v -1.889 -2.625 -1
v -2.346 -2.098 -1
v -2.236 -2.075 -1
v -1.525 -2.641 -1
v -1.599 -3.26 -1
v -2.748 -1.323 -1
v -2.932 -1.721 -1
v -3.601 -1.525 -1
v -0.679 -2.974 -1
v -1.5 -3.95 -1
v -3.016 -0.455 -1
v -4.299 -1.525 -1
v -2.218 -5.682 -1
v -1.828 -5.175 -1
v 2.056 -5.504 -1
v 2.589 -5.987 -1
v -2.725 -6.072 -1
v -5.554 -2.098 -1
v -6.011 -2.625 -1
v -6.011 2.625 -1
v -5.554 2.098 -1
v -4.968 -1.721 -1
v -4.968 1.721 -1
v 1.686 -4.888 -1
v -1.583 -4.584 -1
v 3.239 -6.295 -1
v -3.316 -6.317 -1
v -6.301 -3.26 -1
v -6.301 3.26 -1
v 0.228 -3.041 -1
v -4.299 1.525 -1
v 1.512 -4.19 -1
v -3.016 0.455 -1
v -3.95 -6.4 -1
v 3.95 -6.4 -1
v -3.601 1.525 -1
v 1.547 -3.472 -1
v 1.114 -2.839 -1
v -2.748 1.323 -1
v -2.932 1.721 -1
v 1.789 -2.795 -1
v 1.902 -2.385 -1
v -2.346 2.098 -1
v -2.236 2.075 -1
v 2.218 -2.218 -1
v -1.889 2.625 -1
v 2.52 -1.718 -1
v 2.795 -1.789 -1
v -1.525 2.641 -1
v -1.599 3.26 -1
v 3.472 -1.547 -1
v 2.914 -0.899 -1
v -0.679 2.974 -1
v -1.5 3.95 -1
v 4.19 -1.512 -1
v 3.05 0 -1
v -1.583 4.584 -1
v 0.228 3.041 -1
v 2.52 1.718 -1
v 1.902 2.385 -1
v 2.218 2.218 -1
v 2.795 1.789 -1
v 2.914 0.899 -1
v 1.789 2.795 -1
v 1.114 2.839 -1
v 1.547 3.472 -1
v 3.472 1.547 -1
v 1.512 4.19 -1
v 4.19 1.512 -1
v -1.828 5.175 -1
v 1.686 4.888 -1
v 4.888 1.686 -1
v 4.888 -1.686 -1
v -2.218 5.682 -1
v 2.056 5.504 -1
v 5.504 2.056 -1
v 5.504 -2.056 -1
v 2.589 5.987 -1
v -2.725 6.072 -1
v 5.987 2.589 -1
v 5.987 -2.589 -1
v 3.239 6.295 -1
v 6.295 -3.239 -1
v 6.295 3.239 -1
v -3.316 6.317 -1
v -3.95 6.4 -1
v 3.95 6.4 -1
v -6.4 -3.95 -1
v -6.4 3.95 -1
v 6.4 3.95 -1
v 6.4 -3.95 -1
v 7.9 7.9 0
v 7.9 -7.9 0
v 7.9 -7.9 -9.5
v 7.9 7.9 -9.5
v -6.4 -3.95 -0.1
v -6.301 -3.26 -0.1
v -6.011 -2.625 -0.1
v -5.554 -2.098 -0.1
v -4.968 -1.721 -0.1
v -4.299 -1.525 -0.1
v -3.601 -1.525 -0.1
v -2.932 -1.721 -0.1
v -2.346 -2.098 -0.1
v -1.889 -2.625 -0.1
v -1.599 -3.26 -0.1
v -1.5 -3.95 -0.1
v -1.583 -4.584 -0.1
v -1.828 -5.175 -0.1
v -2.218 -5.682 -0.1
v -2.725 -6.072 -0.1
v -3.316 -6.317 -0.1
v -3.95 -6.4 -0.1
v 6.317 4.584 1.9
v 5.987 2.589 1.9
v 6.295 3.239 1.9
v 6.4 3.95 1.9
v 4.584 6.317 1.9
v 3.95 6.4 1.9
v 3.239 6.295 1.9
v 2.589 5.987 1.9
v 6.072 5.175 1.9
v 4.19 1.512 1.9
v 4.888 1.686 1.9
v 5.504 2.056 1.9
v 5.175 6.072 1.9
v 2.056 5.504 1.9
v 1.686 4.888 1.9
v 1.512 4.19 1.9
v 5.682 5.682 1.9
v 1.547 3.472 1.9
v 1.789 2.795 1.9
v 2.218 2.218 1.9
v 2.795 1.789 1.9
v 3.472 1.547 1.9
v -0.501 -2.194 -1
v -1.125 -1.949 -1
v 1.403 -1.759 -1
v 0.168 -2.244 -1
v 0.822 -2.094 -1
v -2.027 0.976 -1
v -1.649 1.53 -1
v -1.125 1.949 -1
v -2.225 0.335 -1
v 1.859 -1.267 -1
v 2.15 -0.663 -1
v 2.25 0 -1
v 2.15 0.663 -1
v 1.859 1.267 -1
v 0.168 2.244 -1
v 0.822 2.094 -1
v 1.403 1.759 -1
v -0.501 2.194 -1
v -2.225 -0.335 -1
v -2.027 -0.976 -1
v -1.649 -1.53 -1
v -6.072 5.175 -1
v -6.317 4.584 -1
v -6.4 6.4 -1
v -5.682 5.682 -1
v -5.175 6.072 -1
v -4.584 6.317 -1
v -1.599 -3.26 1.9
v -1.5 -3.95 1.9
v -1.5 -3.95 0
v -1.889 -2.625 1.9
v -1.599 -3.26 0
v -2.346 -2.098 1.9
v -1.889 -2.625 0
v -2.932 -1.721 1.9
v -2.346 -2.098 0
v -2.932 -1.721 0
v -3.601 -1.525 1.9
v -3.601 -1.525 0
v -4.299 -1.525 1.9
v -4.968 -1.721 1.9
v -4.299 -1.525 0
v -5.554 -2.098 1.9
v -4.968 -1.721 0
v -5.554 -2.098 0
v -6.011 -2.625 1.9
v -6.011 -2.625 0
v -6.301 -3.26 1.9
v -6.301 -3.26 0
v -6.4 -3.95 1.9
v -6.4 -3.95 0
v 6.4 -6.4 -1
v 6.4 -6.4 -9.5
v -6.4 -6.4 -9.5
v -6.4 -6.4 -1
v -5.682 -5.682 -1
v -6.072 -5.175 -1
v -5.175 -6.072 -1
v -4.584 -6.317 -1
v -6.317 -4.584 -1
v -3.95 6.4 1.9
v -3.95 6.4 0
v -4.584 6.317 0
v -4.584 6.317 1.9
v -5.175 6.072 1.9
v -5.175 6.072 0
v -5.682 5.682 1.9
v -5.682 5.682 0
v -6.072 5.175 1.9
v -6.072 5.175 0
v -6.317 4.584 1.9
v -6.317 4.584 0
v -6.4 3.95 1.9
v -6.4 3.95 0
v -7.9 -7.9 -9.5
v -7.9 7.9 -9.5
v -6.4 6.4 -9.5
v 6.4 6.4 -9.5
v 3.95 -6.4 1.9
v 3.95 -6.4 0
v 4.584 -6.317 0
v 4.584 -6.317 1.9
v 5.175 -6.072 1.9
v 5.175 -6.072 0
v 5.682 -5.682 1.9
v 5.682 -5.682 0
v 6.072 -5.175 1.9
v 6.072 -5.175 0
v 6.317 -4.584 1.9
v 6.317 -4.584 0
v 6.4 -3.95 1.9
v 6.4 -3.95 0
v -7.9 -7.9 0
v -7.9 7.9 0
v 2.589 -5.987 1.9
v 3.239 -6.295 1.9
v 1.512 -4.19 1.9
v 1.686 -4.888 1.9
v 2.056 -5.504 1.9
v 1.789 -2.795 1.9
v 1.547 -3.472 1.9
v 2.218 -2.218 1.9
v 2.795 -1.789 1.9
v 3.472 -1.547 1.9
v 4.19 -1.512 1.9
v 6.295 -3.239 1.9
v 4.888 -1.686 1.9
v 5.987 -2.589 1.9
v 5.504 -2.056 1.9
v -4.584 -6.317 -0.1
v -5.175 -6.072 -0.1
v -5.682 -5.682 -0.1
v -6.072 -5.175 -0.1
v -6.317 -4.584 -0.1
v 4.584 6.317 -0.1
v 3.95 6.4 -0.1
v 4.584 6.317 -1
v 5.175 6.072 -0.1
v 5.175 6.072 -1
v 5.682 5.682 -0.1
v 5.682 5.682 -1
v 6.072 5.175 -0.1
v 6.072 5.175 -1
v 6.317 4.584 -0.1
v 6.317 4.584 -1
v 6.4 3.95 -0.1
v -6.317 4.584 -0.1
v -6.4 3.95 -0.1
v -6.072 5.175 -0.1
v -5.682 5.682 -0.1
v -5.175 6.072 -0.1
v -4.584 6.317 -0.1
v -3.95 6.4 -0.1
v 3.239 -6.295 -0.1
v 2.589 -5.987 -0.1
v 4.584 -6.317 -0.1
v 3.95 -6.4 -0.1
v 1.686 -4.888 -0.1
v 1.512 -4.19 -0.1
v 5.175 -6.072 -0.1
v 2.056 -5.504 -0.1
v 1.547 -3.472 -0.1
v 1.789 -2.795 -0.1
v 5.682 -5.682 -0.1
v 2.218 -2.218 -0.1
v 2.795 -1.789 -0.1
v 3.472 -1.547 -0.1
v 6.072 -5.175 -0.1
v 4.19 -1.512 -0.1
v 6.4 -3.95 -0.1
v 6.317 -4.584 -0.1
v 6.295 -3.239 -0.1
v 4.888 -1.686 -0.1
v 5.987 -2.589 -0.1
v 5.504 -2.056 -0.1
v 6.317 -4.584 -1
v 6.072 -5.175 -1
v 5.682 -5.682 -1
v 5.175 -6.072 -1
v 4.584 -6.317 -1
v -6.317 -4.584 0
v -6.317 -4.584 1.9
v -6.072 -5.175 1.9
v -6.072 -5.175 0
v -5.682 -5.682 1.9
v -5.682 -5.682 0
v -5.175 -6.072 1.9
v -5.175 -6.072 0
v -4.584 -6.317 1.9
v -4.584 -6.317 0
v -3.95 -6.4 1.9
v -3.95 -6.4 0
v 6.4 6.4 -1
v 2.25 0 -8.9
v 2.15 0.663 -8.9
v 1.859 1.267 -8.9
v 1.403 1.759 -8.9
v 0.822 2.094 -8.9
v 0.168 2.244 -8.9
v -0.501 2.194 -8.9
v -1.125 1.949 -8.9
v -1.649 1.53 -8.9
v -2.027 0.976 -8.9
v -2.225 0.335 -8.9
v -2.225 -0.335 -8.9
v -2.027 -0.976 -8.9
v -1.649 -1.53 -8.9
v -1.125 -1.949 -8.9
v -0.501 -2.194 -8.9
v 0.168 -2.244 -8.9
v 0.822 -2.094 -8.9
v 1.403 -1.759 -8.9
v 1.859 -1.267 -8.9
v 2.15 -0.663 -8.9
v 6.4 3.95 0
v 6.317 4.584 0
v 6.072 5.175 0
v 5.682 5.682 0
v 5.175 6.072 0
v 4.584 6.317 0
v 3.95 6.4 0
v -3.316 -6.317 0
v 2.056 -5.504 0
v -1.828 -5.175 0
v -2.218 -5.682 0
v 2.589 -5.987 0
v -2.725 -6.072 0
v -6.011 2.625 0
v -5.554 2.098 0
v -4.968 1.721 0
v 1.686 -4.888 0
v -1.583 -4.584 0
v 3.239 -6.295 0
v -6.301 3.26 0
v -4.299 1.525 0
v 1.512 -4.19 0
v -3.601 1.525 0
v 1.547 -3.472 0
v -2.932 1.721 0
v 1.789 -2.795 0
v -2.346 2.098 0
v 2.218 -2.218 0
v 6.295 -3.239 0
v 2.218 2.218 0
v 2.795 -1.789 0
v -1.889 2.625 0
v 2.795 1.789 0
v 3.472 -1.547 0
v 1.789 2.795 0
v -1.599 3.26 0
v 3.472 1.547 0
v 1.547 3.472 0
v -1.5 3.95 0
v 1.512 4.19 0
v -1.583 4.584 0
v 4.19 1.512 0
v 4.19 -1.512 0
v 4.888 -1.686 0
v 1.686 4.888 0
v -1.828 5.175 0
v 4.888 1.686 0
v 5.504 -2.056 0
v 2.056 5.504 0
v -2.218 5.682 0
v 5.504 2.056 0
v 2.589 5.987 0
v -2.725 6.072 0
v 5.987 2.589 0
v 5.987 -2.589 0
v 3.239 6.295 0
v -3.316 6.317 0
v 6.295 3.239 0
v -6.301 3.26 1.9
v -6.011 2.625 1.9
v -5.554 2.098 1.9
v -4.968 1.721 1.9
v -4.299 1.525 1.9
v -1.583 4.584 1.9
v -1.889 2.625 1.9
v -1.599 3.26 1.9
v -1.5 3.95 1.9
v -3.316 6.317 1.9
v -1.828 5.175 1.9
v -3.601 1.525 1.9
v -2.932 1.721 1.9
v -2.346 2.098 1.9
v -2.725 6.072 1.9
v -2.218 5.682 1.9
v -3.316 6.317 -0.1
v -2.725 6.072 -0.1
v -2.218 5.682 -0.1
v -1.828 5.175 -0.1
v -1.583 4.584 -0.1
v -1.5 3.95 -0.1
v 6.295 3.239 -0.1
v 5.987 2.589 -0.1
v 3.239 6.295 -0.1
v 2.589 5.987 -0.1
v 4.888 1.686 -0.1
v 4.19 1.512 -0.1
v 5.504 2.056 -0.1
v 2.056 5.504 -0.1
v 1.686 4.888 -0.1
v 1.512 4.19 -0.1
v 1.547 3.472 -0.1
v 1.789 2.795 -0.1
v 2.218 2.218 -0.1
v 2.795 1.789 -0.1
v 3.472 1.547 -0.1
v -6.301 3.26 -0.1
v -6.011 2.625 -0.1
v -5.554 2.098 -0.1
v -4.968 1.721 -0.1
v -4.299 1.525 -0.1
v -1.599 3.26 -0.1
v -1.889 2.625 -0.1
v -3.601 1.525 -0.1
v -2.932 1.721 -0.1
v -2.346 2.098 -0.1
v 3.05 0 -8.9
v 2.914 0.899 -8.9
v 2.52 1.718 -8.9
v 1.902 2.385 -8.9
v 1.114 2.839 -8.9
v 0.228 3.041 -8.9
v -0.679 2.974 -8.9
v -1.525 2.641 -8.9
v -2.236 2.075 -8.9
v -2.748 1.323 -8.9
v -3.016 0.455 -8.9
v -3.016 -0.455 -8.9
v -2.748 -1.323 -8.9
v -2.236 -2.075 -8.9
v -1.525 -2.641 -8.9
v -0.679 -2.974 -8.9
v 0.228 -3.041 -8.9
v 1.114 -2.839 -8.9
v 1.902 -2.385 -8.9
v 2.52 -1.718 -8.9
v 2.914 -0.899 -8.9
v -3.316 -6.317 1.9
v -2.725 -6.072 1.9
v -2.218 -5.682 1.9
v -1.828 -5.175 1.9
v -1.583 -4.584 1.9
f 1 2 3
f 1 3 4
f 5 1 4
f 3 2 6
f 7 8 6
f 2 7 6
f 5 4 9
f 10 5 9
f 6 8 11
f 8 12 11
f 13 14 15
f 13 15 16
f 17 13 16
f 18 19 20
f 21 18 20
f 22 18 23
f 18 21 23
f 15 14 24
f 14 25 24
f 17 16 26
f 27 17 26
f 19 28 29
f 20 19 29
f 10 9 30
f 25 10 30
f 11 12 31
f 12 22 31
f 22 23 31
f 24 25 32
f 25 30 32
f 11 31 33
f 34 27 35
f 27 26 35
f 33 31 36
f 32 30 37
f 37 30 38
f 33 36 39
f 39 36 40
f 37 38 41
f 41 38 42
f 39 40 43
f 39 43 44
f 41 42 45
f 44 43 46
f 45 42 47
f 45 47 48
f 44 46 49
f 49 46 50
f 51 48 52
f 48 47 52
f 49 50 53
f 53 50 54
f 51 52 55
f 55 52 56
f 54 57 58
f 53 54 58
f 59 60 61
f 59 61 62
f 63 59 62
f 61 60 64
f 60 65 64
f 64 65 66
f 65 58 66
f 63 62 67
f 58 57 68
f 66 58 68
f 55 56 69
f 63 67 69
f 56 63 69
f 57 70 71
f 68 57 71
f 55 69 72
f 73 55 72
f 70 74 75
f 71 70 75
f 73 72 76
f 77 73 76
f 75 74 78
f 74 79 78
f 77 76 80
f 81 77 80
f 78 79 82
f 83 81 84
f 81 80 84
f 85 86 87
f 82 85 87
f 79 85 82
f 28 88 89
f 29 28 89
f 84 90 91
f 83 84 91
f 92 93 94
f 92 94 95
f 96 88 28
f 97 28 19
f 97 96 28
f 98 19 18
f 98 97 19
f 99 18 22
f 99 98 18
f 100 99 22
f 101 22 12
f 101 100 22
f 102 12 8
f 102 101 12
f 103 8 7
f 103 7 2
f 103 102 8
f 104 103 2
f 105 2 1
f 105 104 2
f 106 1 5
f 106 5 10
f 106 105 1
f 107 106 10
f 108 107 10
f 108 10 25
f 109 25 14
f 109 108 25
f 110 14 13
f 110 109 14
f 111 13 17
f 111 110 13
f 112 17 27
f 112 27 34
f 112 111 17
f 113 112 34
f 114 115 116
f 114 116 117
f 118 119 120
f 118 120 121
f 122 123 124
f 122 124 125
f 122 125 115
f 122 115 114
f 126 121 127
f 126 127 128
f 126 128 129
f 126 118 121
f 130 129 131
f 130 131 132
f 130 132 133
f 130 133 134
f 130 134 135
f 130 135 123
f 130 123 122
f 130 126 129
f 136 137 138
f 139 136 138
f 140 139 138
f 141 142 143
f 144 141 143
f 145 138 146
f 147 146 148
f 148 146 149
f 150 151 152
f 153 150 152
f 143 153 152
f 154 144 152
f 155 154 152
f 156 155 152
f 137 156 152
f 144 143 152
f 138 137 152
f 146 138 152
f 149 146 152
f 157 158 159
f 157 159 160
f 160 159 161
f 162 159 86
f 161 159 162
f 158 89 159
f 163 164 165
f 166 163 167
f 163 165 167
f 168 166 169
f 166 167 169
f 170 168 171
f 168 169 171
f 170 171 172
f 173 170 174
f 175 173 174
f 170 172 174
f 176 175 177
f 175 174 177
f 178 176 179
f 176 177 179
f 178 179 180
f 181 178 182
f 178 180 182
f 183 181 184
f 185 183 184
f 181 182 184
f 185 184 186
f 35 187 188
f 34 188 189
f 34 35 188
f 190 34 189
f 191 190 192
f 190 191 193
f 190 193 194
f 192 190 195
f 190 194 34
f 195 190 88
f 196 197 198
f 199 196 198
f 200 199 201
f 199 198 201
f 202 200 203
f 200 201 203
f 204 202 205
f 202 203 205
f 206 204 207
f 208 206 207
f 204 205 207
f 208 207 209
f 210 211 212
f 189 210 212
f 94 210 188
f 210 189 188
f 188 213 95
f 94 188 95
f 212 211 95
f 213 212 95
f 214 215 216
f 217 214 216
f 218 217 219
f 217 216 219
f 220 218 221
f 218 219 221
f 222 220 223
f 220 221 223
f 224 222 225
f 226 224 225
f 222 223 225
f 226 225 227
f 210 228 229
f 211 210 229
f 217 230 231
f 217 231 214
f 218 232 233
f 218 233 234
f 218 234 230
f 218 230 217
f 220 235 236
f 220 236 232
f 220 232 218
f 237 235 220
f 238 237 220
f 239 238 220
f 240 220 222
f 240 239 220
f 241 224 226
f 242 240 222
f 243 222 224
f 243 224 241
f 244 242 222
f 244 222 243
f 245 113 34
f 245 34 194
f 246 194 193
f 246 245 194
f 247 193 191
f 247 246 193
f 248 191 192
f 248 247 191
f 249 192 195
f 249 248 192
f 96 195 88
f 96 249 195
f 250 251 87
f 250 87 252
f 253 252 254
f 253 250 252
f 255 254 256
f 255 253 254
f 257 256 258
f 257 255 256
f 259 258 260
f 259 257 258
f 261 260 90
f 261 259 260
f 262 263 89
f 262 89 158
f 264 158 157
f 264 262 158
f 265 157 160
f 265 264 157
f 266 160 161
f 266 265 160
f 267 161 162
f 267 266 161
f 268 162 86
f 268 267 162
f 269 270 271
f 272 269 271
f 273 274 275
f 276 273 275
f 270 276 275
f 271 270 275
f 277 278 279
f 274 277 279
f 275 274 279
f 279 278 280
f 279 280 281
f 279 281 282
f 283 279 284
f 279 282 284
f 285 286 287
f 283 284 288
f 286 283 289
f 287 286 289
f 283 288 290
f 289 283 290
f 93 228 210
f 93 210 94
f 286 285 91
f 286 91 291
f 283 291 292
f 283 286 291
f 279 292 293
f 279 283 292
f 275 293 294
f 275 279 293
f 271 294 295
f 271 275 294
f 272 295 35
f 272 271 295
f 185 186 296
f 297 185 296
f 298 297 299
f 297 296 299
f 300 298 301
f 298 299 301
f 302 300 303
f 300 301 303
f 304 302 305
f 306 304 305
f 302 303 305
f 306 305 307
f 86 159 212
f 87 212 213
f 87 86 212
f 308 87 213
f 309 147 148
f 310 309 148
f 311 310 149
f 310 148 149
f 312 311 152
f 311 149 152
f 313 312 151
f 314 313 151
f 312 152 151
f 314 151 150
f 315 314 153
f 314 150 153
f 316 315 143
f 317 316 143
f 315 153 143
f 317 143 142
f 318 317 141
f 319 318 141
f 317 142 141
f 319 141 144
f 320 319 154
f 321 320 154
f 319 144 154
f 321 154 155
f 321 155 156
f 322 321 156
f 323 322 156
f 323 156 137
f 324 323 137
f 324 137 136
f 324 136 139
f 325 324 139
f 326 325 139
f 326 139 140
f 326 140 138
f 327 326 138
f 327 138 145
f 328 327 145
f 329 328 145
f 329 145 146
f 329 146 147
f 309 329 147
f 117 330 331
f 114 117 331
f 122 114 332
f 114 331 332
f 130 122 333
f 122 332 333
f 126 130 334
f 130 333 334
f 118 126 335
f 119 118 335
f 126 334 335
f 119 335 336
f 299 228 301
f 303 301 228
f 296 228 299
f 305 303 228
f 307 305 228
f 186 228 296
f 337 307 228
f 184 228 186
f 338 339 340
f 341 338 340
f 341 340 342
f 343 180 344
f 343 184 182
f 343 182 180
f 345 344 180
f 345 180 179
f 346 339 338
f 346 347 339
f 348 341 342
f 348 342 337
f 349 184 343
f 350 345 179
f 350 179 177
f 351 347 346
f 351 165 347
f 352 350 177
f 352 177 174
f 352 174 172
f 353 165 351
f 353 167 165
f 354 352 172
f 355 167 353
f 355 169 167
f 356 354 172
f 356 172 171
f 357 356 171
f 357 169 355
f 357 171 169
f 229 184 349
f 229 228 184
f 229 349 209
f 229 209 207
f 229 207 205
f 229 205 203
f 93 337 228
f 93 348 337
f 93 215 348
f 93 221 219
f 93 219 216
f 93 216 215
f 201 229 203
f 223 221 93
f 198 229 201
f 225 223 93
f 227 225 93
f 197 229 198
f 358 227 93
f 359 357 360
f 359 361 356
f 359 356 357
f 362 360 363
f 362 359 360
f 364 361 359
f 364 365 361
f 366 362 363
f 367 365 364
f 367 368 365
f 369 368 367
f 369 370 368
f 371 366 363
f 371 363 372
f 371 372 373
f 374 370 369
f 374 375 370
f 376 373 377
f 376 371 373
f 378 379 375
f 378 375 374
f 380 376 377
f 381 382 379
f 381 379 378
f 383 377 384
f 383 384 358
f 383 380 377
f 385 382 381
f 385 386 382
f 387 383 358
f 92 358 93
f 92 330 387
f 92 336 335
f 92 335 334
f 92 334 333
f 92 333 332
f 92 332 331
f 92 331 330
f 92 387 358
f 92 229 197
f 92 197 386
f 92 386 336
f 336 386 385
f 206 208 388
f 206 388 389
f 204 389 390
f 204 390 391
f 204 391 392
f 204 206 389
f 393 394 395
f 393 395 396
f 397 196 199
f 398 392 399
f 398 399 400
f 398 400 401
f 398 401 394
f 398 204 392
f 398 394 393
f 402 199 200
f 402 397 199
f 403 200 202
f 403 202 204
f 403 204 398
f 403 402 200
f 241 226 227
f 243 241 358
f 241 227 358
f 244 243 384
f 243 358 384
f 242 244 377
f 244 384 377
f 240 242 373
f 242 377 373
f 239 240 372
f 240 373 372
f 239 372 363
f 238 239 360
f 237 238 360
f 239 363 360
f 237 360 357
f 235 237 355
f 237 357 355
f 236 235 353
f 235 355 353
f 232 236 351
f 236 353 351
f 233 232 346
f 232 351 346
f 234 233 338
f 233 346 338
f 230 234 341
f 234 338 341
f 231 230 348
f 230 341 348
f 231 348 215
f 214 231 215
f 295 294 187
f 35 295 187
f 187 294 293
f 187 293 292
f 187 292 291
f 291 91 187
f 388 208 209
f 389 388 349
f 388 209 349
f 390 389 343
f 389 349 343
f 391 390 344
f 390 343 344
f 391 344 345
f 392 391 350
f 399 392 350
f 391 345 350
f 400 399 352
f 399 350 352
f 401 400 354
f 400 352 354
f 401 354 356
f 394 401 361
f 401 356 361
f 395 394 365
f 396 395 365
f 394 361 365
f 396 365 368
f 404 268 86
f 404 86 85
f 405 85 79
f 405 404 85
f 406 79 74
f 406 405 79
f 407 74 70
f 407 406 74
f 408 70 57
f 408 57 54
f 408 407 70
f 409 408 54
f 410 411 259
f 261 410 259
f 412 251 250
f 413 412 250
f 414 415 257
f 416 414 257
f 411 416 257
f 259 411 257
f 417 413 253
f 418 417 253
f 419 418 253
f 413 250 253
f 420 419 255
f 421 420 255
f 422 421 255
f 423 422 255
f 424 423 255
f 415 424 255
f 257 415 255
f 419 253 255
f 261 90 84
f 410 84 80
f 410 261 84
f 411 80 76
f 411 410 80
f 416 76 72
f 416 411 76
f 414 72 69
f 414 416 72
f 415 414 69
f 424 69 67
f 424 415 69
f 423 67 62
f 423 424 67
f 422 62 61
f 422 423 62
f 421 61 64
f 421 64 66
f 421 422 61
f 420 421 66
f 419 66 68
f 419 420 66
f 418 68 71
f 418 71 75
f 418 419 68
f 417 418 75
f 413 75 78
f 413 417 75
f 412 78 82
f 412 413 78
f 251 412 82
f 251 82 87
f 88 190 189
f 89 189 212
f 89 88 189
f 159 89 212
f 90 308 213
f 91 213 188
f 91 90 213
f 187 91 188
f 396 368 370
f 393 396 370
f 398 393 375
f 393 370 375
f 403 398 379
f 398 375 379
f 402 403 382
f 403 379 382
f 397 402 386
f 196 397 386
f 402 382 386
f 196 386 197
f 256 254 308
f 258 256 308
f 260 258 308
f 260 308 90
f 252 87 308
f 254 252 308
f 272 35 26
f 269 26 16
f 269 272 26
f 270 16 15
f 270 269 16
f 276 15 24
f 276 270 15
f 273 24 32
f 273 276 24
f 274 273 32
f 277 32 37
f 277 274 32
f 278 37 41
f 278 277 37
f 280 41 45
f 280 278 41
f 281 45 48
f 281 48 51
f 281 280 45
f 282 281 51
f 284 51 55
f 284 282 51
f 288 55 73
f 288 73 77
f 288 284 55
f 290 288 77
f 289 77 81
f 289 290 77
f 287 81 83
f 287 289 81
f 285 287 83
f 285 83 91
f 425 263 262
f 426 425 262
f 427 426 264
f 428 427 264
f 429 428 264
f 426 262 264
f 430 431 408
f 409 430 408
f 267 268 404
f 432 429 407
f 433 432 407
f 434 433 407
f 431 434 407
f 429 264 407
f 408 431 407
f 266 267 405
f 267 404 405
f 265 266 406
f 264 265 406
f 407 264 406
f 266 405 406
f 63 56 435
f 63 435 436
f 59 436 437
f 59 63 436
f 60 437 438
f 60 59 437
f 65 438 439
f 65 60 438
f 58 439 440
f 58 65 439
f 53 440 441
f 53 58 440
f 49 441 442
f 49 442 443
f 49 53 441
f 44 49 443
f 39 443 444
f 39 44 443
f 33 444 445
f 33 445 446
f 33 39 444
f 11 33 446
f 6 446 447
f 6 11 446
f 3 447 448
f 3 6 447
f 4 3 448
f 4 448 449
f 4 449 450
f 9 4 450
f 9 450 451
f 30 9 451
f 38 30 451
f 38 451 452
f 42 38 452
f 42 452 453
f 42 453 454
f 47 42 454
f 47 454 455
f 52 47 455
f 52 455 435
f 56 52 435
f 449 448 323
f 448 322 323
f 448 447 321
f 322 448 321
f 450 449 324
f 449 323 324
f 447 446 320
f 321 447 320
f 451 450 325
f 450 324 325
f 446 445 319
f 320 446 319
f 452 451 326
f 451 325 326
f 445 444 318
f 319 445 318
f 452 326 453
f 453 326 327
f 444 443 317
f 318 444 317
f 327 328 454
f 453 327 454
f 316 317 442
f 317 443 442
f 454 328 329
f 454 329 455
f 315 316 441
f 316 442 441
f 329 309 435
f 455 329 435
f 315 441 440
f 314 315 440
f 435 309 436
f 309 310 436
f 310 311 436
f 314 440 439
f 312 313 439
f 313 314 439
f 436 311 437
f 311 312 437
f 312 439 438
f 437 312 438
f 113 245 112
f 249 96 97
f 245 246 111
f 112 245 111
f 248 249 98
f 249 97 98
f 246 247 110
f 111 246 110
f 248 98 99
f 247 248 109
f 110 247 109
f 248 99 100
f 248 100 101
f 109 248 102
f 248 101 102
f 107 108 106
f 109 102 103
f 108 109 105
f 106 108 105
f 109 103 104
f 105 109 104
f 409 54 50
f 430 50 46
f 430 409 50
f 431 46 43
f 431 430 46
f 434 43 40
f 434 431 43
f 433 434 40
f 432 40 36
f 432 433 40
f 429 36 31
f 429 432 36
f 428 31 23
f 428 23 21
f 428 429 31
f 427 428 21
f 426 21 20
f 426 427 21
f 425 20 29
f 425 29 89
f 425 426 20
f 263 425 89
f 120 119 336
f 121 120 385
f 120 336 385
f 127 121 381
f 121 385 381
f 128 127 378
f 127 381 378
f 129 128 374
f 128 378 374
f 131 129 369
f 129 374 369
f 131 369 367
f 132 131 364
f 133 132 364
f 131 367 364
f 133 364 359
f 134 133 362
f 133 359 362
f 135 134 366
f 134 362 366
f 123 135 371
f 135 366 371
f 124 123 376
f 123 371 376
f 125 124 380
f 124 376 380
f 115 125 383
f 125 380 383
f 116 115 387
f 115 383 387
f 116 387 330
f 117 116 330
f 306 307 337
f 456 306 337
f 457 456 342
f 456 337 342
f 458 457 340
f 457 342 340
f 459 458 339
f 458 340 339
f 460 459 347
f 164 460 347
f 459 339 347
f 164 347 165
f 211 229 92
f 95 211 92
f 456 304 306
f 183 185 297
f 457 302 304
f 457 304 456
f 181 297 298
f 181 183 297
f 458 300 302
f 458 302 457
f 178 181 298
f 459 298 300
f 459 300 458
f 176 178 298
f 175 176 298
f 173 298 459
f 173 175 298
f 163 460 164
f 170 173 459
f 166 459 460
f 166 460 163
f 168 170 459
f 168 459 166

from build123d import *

# Parameters (mm, degrees)
F0_W          = 15.8
F0_H          = 15.8
F1_DEPTH      = 9.5
F0_R          = 3.05
F2_DEPTH      = 1
F0_R_2        = 2.25
F3_DEPTH      = 1.9
F3_DEPTH_BACK = 0.1
F4_DEPTH      = 8.9


with BuildPart() as f1:
    # F0 (on Top) → F1 (new body)
    with BuildSketch(Plane.XY):
        Rectangle(F0_W, F0_H)
        Polygon((3.95, 6.4), (6.4, 6.4), (6.4, 3.95), (6.4, -3.95), (6.4, -6.4), (3.95, -6.4), (-3.95, -6.4), (-6.4, -6.4), (-6.4, -3.95), (-6.4, 3.95), (-6.4, 6.4), (-3.95, 6.4), align=None, mode=Mode.SUBTRACT)
    extrude(amount=-F1_DEPTH)

    # F0 (on Top) → F2 (join)
    with BuildSketch(Plane.XY):
        with BuildLine():
            ThreePointArc((6.4, 3.95), (2.2175883861, 2.2175883861), (3.95, 6.4))
            Line((3.95, 6.4), (-3.95, 6.4))
            ThreePointArc((-3.95, 6.4), (-2.2175883861, 5.6824116139), (-1.5, 3.95))
            ThreePointArc((-1.5, 3.95), (-3.95, 1.5), (-6.4, 3.95))
            Line((-6.4, 3.95), (-6.4, -3.95))
            ThreePointArc((-6.4, -3.95), (-3.95, -1.5), (-1.5, -3.95))
            ThreePointArc((-1.5, -3.95), (-2.2175883861, -5.6824116139), (-3.95, -6.4))
            Line((-3.95, -6.4), (3.95, -6.4))
            ThreePointArc((3.95, -6.4), (2.2175883861, -2.2175883861), (6.4, -3.95))
            Line((6.4, -3.95), (6.4, 3.95))
        make_face()
        Circle(F0_R, mode=Mode.SUBTRACT)
        with BuildLine():
            ThreePointArc((-6.4, 3.95), (-5.6824116139, 5.6824116139), (-3.95, 6.4))
            Line((-3.95, 6.4), (-6.4, 6.4))
            Line((-6.4, 6.4), (-6.4, 3.95))
        make_face()
        with BuildLine():
            Line((6.4, 3.95), (6.4, 6.4))
            Line((6.4, 6.4), (3.95, 6.4))
            ThreePointArc((3.95, 6.4), (5.6824116139, 5.6824116139), (6.4, 3.95))
        make_face()
        with BuildLine():
            Line((6.4, -6.4), (6.4, -3.95))
            ThreePointArc((6.4, -3.95), (5.6824116139, -5.6824116139), (3.95, -6.4))
            Line((3.95, -6.4), (6.4, -6.4))
        make_face()
        with BuildLine():
            ThreePointArc((-3.95, -6.4), (-5.6824116139, -5.6824116139), (-6.4, -3.95))
            Line((-6.4, -3.95), (-6.4, -6.4))
            Line((-6.4, -6.4), (-3.95, -6.4))
        make_face()
    extrude(amount=-F2_DEPTH)

    # F0 (on Top) → F3 (join, two sides)
    with BuildSketch(Plane.XY) as f3_sk:
        with BuildLine():
            ThreePointArc((-1.5, -3.95), (-3.95, -1.5), (-6.4, -3.95))
            ThreePointArc((-6.4, -3.95), (-5.6824116139, -5.6824116139), (-3.95, -6.4))
            ThreePointArc((-3.95, -6.4), (-2.2175883861, -5.6824116139), (-1.5, -3.95))
        make_face()
        with BuildLine():
            ThreePointArc((-1.5, 3.95), (-2.2175883861, 5.6824116139), (-3.95, 6.4))
            ThreePointArc((-3.95, 6.4), (-5.6824116139, 5.6824116139), (-6.4, 3.95))
            ThreePointArc((-6.4, 3.95), (-3.95, 1.5), (-1.5, 3.95))
        make_face()
        with BuildLine():
            ThreePointArc((6.4, 3.95), (5.6824116139, 5.6824116139), (3.95, 6.4))
            ThreePointArc((3.95, 6.4), (2.2175883861, 2.2175883861), (6.4, 3.95))
        make_face()
        with BuildLine():
            ThreePointArc((3.95, -6.4), (5.6824116139, -5.6824116139), (6.4, -3.95))
            ThreePointArc((6.4, -3.95), (2.2175883861, -2.2175883861), (3.95, -6.4))
        make_face()
    extrude(amount=F3_DEPTH)
    extrude(f3_sk.sketch, amount=-F3_DEPTH_BACK)



with BuildPart() as f2:
    # F0 (on Top) → F2, piece 2 (new body)
    with BuildSketch(Plane.XY):
        Circle(F0_R_2)
    extrude(amount=-F2_DEPTH)


with BuildPart() as f1_1:
    add(f1.part)

    add(f2.part)  # F4 merges F2
    # F0 (on Top) → F4 (join)
    with BuildSketch(Plane.XY):
        Circle(F0_R)
        Circle(F0_R_2, mode=Mode.SUBTRACT)
    extrude(amount=-F4_DEPTH)


solid = f1_1.part
